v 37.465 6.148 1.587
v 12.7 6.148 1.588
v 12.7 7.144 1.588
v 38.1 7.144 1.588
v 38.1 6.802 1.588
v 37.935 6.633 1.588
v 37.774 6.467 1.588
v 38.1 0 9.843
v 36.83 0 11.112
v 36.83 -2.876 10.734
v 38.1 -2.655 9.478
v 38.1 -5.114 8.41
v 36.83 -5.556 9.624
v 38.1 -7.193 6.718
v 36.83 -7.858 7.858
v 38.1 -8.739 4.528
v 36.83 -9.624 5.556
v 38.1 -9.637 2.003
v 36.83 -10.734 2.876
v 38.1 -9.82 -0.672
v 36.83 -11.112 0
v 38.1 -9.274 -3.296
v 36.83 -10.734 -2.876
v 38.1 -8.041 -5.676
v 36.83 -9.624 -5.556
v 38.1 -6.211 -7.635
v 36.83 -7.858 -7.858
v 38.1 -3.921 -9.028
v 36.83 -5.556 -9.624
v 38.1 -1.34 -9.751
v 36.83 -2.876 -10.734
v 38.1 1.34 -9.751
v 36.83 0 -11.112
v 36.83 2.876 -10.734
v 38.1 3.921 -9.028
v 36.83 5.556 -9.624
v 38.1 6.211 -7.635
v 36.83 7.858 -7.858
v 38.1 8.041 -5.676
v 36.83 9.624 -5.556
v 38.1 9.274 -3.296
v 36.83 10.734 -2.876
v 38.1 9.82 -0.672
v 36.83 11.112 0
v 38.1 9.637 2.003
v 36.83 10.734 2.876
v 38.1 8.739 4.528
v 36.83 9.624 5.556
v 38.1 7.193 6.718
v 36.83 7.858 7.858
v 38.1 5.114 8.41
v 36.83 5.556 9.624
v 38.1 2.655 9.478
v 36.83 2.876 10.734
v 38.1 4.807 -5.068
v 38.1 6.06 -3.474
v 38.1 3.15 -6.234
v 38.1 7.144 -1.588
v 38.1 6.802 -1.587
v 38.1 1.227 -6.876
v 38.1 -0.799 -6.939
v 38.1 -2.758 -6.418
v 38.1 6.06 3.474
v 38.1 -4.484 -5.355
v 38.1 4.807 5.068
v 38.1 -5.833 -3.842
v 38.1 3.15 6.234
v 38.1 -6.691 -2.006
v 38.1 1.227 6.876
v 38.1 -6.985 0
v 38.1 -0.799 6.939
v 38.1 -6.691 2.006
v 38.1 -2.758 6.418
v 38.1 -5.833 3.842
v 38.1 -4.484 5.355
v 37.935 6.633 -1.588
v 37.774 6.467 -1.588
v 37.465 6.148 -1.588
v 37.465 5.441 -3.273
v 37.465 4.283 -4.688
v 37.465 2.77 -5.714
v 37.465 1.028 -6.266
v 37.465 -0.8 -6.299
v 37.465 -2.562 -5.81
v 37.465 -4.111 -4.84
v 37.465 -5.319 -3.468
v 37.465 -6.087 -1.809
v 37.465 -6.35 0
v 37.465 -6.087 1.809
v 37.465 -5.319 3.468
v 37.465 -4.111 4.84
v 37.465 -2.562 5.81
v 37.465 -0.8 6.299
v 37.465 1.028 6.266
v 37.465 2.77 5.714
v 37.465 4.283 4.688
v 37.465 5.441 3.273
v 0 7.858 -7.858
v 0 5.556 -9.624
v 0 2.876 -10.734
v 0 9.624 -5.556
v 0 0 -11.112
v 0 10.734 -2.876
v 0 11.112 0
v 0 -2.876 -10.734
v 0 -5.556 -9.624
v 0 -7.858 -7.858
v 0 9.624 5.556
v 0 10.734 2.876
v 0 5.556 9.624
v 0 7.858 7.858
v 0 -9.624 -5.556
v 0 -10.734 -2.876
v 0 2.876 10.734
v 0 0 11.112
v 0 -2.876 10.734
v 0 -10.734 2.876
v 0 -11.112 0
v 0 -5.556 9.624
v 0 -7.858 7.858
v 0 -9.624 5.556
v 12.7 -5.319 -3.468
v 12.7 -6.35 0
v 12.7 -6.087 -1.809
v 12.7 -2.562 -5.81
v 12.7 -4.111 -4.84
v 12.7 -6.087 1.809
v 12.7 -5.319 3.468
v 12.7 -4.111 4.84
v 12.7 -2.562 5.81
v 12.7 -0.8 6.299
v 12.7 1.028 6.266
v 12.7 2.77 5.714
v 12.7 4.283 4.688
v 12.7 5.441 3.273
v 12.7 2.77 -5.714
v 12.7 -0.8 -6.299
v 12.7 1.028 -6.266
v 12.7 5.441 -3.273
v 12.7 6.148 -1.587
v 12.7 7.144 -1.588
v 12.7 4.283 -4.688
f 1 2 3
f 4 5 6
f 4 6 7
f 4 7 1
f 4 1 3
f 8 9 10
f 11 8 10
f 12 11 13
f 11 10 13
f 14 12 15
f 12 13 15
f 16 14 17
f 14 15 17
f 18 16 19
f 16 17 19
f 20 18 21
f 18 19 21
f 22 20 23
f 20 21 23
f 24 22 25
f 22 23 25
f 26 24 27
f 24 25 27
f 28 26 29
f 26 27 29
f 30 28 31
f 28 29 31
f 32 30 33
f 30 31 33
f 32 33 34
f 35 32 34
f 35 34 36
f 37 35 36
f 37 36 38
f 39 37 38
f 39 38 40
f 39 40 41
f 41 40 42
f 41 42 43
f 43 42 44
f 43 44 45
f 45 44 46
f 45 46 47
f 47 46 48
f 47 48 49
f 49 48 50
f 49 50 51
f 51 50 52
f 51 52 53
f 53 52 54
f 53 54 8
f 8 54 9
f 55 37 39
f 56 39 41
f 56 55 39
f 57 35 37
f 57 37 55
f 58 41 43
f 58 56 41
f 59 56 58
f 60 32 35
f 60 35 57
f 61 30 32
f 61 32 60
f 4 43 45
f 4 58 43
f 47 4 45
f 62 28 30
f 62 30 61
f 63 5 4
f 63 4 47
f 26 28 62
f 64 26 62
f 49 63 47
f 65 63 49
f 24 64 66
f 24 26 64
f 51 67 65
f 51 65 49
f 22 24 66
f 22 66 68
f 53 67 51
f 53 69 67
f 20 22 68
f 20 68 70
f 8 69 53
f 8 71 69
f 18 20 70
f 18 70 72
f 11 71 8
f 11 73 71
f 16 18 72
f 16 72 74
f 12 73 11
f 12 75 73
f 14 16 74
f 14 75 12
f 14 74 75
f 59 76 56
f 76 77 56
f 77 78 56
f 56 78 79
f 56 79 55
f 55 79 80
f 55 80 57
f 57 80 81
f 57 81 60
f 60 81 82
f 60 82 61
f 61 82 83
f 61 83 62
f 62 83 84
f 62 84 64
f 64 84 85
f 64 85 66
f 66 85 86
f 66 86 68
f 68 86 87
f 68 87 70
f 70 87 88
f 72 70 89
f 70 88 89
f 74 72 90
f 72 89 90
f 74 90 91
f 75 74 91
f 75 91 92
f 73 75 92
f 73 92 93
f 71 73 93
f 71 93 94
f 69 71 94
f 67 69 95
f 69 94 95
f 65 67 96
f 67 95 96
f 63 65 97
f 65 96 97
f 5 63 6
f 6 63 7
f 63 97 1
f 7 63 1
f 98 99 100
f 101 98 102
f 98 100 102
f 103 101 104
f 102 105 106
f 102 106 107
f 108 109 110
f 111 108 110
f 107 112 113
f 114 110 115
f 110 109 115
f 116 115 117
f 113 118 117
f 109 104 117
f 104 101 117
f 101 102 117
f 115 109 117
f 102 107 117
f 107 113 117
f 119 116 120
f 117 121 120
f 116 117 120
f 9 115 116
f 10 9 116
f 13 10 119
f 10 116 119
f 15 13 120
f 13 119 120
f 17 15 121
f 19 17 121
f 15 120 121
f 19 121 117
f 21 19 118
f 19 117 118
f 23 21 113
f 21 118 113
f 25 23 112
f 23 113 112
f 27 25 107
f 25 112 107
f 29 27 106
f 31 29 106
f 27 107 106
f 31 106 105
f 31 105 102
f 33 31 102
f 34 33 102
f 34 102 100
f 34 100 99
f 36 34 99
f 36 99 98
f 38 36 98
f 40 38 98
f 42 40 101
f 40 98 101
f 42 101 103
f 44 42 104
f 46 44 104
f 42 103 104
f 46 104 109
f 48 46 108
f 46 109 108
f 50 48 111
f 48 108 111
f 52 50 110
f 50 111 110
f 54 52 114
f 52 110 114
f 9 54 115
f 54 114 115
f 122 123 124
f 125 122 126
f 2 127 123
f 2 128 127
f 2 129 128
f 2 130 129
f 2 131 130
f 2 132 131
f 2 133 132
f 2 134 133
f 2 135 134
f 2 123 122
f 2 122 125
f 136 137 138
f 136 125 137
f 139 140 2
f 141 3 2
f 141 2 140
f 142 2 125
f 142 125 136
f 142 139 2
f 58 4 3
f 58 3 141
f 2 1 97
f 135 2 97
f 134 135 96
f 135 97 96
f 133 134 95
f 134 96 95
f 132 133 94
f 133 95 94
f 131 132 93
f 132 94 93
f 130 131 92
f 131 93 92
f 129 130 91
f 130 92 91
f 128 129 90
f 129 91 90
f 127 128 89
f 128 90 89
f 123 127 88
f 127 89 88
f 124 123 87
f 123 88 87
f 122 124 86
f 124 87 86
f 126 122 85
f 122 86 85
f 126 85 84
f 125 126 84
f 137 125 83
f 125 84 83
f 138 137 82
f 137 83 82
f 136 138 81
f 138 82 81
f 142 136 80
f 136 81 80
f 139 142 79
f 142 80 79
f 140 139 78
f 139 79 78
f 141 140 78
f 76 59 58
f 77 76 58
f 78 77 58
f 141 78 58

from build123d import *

# Parameters (mm, degrees)
SKETCH1_R           = 11.1125
BOSS_EXTRUDE1_DEPTH = 38.1
SKETCH2_R           = 6.35
CUT_EXTRUDE1_DEPTH  = 25.4
SKETCH3_W           = 3.175
SKETCH3_H           = 1.5875
CUT_EXTRUDE2_DEPTH  = 25.4
CHAMFER2_SIZE       = 0.635
CHAMFER3_SIZE       = 1.27


with BuildPart() as part:
    # Sketch1 → Boss-Extrude1 (new body)
    with BuildSketch(Plane(origin=(0, 0, 0), x_dir=(0, 0, -1), z_dir=(1, 0, 0))):
        with Locations(Location((0, 0, 0), (0, 0, 180))):
            Circle(SKETCH1_R)
    extrude(amount=BOSS_EXTRUDE1_DEPTH)

    # Sketch2 → Cut-Extrude1 (cut)
    with BuildSketch(Plane(origin=(38.1, 0, 0), x_dir=(0, 0, -1), z_dir=(1, 0, 0))):
        Circle(SKETCH2_R)
    extrude(amount=-CUT_EXTRUDE1_DEPTH, mode=Mode.SUBTRACT)

    # Sketch3 → Cut-Extrude2 (cut)
    with BuildSketch(Plane(origin=(38.1, 0, 0), x_dir=(0, 0, -1), z_dir=(1, 0, 0))):
        with Locations((0, 6.35)):
            Rectangle(SKETCH3_W, SKETCH3_H)
    extrude(amount=-CUT_EXTRUDE2_DEPTH, mode=Mode.SUBTRACT)

    # Chamfer2
    chamfer2_edges = [part.edges().sort_by_distance(p)[0] for p in [
        (38.1, -6.35, 0),
    ]]
    chamfer(chamfer2_edges, length=CHAMFER2_SIZE)

    # Chamfer3
    chamfer3_edges = [part.edges().sort_by_distance(p)[0] for p in [
        (38.1, 0, -11.1125),
    ]]
    chamfer(chamfer3_edges, length=CHAMFER3_SIZE)


solid = part.part
